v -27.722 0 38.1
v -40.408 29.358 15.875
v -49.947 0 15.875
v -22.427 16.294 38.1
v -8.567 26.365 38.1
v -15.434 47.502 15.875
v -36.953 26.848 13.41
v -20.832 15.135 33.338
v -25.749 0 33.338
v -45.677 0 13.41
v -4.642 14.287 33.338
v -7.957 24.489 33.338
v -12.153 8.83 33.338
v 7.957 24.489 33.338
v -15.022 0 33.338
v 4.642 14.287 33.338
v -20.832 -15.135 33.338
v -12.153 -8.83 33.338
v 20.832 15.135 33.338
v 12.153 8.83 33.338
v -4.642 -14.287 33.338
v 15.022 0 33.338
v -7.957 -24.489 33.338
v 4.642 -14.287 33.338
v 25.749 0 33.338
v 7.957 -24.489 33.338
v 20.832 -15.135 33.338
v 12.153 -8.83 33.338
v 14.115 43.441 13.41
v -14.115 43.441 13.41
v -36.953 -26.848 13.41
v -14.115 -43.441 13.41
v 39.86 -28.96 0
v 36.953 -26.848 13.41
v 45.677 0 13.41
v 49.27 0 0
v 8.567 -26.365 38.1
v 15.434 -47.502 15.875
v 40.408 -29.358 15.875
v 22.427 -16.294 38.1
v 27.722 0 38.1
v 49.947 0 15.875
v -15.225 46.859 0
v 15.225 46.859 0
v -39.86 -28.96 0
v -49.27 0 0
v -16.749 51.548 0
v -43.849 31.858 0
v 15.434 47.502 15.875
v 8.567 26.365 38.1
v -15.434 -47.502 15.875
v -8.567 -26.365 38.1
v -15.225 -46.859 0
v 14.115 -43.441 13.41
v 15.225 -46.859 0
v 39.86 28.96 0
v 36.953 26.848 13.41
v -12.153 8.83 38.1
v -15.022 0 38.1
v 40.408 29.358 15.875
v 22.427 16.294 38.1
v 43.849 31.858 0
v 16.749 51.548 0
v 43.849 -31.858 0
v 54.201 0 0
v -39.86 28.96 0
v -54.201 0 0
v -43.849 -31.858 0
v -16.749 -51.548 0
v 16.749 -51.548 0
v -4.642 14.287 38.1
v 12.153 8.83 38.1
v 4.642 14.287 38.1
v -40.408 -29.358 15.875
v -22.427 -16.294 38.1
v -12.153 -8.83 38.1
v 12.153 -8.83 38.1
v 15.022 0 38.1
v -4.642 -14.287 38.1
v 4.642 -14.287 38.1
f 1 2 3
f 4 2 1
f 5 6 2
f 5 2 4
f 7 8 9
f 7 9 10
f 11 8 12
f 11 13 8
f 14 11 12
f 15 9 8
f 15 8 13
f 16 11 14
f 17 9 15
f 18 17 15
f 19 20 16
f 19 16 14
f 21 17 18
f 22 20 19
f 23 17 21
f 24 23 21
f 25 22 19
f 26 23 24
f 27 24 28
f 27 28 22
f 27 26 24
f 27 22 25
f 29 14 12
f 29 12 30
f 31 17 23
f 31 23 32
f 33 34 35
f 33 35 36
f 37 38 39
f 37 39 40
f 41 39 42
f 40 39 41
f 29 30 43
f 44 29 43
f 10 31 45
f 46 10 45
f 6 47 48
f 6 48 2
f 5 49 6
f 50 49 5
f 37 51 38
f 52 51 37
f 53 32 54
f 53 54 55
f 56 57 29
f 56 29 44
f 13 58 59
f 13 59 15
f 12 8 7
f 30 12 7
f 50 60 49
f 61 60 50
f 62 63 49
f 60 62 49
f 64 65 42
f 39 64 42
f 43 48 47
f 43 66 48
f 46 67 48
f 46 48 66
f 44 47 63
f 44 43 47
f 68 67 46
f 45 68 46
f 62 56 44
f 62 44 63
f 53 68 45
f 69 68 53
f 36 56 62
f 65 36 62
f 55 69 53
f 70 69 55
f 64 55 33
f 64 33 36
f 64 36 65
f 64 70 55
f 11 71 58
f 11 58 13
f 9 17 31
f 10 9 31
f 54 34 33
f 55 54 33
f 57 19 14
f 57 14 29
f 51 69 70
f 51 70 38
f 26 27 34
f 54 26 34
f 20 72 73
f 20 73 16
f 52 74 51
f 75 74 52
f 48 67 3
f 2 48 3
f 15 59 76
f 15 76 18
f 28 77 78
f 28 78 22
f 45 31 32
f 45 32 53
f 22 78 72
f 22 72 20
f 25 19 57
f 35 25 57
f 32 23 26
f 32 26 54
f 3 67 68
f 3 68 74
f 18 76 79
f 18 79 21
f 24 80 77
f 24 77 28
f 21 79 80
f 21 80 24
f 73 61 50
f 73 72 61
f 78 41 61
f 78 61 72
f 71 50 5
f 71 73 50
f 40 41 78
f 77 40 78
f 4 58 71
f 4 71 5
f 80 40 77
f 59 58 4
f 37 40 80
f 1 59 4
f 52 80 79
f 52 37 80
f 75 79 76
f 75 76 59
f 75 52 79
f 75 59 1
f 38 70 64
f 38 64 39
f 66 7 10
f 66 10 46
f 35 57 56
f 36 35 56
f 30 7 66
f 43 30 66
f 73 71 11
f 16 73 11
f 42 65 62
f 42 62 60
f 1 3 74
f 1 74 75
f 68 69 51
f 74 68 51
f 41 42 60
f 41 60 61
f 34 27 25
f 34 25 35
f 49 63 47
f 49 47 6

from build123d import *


with BuildPart() as f2:
    # F2: sweep along a path in F0
    with BuildLine(Plane.XY) as f2_path:
        Line((43.8491681264, 31.8582854615), (54.2005525611, 0))
        Line((54.2005525611, 0), (43.8491681264, -31.8582854615))
        Line((43.8491681264, -31.8582854615), (16.7488918459, -51.5477887))
        Line((16.7488918459, -51.5477887), (-16.7488918459, -51.5477887))
        Line((-16.7488918459, -51.5477887), (-43.8491681264, -31.8582854615))
        Line((-43.8491681264, -31.8582854615), (-54.2005525611, 0))
        Line((-54.2005525611, 0), (-43.8491681264, 31.8582854615))
        Line((-43.8491681264, 31.8582854615), (-16.7488918459, 51.5477887))
        Line((-16.7488918459, 51.5477887), (16.7488918459, 51.5477887))
        Line((16.7488918459, 51.5477887), (43.8491681264, 31.8582854615))
    # F1 (on Front) → F2 (sweep)
    with BuildSketch(Plane.XZ):
        Polygon((45.676918445, 13.4097485954), (49.2700497519, 0), (54.2005525611, 0), (49.9468591312, 15.875), (27.7218591312, 38.1), (15.0218591312, 38.1), (15.0218591312, 33.3375), (25.7491670404, 33.3375), align=None)
    sweep(path=f2_path.line, transition=Transition.RIGHT)


solid = f2.part
